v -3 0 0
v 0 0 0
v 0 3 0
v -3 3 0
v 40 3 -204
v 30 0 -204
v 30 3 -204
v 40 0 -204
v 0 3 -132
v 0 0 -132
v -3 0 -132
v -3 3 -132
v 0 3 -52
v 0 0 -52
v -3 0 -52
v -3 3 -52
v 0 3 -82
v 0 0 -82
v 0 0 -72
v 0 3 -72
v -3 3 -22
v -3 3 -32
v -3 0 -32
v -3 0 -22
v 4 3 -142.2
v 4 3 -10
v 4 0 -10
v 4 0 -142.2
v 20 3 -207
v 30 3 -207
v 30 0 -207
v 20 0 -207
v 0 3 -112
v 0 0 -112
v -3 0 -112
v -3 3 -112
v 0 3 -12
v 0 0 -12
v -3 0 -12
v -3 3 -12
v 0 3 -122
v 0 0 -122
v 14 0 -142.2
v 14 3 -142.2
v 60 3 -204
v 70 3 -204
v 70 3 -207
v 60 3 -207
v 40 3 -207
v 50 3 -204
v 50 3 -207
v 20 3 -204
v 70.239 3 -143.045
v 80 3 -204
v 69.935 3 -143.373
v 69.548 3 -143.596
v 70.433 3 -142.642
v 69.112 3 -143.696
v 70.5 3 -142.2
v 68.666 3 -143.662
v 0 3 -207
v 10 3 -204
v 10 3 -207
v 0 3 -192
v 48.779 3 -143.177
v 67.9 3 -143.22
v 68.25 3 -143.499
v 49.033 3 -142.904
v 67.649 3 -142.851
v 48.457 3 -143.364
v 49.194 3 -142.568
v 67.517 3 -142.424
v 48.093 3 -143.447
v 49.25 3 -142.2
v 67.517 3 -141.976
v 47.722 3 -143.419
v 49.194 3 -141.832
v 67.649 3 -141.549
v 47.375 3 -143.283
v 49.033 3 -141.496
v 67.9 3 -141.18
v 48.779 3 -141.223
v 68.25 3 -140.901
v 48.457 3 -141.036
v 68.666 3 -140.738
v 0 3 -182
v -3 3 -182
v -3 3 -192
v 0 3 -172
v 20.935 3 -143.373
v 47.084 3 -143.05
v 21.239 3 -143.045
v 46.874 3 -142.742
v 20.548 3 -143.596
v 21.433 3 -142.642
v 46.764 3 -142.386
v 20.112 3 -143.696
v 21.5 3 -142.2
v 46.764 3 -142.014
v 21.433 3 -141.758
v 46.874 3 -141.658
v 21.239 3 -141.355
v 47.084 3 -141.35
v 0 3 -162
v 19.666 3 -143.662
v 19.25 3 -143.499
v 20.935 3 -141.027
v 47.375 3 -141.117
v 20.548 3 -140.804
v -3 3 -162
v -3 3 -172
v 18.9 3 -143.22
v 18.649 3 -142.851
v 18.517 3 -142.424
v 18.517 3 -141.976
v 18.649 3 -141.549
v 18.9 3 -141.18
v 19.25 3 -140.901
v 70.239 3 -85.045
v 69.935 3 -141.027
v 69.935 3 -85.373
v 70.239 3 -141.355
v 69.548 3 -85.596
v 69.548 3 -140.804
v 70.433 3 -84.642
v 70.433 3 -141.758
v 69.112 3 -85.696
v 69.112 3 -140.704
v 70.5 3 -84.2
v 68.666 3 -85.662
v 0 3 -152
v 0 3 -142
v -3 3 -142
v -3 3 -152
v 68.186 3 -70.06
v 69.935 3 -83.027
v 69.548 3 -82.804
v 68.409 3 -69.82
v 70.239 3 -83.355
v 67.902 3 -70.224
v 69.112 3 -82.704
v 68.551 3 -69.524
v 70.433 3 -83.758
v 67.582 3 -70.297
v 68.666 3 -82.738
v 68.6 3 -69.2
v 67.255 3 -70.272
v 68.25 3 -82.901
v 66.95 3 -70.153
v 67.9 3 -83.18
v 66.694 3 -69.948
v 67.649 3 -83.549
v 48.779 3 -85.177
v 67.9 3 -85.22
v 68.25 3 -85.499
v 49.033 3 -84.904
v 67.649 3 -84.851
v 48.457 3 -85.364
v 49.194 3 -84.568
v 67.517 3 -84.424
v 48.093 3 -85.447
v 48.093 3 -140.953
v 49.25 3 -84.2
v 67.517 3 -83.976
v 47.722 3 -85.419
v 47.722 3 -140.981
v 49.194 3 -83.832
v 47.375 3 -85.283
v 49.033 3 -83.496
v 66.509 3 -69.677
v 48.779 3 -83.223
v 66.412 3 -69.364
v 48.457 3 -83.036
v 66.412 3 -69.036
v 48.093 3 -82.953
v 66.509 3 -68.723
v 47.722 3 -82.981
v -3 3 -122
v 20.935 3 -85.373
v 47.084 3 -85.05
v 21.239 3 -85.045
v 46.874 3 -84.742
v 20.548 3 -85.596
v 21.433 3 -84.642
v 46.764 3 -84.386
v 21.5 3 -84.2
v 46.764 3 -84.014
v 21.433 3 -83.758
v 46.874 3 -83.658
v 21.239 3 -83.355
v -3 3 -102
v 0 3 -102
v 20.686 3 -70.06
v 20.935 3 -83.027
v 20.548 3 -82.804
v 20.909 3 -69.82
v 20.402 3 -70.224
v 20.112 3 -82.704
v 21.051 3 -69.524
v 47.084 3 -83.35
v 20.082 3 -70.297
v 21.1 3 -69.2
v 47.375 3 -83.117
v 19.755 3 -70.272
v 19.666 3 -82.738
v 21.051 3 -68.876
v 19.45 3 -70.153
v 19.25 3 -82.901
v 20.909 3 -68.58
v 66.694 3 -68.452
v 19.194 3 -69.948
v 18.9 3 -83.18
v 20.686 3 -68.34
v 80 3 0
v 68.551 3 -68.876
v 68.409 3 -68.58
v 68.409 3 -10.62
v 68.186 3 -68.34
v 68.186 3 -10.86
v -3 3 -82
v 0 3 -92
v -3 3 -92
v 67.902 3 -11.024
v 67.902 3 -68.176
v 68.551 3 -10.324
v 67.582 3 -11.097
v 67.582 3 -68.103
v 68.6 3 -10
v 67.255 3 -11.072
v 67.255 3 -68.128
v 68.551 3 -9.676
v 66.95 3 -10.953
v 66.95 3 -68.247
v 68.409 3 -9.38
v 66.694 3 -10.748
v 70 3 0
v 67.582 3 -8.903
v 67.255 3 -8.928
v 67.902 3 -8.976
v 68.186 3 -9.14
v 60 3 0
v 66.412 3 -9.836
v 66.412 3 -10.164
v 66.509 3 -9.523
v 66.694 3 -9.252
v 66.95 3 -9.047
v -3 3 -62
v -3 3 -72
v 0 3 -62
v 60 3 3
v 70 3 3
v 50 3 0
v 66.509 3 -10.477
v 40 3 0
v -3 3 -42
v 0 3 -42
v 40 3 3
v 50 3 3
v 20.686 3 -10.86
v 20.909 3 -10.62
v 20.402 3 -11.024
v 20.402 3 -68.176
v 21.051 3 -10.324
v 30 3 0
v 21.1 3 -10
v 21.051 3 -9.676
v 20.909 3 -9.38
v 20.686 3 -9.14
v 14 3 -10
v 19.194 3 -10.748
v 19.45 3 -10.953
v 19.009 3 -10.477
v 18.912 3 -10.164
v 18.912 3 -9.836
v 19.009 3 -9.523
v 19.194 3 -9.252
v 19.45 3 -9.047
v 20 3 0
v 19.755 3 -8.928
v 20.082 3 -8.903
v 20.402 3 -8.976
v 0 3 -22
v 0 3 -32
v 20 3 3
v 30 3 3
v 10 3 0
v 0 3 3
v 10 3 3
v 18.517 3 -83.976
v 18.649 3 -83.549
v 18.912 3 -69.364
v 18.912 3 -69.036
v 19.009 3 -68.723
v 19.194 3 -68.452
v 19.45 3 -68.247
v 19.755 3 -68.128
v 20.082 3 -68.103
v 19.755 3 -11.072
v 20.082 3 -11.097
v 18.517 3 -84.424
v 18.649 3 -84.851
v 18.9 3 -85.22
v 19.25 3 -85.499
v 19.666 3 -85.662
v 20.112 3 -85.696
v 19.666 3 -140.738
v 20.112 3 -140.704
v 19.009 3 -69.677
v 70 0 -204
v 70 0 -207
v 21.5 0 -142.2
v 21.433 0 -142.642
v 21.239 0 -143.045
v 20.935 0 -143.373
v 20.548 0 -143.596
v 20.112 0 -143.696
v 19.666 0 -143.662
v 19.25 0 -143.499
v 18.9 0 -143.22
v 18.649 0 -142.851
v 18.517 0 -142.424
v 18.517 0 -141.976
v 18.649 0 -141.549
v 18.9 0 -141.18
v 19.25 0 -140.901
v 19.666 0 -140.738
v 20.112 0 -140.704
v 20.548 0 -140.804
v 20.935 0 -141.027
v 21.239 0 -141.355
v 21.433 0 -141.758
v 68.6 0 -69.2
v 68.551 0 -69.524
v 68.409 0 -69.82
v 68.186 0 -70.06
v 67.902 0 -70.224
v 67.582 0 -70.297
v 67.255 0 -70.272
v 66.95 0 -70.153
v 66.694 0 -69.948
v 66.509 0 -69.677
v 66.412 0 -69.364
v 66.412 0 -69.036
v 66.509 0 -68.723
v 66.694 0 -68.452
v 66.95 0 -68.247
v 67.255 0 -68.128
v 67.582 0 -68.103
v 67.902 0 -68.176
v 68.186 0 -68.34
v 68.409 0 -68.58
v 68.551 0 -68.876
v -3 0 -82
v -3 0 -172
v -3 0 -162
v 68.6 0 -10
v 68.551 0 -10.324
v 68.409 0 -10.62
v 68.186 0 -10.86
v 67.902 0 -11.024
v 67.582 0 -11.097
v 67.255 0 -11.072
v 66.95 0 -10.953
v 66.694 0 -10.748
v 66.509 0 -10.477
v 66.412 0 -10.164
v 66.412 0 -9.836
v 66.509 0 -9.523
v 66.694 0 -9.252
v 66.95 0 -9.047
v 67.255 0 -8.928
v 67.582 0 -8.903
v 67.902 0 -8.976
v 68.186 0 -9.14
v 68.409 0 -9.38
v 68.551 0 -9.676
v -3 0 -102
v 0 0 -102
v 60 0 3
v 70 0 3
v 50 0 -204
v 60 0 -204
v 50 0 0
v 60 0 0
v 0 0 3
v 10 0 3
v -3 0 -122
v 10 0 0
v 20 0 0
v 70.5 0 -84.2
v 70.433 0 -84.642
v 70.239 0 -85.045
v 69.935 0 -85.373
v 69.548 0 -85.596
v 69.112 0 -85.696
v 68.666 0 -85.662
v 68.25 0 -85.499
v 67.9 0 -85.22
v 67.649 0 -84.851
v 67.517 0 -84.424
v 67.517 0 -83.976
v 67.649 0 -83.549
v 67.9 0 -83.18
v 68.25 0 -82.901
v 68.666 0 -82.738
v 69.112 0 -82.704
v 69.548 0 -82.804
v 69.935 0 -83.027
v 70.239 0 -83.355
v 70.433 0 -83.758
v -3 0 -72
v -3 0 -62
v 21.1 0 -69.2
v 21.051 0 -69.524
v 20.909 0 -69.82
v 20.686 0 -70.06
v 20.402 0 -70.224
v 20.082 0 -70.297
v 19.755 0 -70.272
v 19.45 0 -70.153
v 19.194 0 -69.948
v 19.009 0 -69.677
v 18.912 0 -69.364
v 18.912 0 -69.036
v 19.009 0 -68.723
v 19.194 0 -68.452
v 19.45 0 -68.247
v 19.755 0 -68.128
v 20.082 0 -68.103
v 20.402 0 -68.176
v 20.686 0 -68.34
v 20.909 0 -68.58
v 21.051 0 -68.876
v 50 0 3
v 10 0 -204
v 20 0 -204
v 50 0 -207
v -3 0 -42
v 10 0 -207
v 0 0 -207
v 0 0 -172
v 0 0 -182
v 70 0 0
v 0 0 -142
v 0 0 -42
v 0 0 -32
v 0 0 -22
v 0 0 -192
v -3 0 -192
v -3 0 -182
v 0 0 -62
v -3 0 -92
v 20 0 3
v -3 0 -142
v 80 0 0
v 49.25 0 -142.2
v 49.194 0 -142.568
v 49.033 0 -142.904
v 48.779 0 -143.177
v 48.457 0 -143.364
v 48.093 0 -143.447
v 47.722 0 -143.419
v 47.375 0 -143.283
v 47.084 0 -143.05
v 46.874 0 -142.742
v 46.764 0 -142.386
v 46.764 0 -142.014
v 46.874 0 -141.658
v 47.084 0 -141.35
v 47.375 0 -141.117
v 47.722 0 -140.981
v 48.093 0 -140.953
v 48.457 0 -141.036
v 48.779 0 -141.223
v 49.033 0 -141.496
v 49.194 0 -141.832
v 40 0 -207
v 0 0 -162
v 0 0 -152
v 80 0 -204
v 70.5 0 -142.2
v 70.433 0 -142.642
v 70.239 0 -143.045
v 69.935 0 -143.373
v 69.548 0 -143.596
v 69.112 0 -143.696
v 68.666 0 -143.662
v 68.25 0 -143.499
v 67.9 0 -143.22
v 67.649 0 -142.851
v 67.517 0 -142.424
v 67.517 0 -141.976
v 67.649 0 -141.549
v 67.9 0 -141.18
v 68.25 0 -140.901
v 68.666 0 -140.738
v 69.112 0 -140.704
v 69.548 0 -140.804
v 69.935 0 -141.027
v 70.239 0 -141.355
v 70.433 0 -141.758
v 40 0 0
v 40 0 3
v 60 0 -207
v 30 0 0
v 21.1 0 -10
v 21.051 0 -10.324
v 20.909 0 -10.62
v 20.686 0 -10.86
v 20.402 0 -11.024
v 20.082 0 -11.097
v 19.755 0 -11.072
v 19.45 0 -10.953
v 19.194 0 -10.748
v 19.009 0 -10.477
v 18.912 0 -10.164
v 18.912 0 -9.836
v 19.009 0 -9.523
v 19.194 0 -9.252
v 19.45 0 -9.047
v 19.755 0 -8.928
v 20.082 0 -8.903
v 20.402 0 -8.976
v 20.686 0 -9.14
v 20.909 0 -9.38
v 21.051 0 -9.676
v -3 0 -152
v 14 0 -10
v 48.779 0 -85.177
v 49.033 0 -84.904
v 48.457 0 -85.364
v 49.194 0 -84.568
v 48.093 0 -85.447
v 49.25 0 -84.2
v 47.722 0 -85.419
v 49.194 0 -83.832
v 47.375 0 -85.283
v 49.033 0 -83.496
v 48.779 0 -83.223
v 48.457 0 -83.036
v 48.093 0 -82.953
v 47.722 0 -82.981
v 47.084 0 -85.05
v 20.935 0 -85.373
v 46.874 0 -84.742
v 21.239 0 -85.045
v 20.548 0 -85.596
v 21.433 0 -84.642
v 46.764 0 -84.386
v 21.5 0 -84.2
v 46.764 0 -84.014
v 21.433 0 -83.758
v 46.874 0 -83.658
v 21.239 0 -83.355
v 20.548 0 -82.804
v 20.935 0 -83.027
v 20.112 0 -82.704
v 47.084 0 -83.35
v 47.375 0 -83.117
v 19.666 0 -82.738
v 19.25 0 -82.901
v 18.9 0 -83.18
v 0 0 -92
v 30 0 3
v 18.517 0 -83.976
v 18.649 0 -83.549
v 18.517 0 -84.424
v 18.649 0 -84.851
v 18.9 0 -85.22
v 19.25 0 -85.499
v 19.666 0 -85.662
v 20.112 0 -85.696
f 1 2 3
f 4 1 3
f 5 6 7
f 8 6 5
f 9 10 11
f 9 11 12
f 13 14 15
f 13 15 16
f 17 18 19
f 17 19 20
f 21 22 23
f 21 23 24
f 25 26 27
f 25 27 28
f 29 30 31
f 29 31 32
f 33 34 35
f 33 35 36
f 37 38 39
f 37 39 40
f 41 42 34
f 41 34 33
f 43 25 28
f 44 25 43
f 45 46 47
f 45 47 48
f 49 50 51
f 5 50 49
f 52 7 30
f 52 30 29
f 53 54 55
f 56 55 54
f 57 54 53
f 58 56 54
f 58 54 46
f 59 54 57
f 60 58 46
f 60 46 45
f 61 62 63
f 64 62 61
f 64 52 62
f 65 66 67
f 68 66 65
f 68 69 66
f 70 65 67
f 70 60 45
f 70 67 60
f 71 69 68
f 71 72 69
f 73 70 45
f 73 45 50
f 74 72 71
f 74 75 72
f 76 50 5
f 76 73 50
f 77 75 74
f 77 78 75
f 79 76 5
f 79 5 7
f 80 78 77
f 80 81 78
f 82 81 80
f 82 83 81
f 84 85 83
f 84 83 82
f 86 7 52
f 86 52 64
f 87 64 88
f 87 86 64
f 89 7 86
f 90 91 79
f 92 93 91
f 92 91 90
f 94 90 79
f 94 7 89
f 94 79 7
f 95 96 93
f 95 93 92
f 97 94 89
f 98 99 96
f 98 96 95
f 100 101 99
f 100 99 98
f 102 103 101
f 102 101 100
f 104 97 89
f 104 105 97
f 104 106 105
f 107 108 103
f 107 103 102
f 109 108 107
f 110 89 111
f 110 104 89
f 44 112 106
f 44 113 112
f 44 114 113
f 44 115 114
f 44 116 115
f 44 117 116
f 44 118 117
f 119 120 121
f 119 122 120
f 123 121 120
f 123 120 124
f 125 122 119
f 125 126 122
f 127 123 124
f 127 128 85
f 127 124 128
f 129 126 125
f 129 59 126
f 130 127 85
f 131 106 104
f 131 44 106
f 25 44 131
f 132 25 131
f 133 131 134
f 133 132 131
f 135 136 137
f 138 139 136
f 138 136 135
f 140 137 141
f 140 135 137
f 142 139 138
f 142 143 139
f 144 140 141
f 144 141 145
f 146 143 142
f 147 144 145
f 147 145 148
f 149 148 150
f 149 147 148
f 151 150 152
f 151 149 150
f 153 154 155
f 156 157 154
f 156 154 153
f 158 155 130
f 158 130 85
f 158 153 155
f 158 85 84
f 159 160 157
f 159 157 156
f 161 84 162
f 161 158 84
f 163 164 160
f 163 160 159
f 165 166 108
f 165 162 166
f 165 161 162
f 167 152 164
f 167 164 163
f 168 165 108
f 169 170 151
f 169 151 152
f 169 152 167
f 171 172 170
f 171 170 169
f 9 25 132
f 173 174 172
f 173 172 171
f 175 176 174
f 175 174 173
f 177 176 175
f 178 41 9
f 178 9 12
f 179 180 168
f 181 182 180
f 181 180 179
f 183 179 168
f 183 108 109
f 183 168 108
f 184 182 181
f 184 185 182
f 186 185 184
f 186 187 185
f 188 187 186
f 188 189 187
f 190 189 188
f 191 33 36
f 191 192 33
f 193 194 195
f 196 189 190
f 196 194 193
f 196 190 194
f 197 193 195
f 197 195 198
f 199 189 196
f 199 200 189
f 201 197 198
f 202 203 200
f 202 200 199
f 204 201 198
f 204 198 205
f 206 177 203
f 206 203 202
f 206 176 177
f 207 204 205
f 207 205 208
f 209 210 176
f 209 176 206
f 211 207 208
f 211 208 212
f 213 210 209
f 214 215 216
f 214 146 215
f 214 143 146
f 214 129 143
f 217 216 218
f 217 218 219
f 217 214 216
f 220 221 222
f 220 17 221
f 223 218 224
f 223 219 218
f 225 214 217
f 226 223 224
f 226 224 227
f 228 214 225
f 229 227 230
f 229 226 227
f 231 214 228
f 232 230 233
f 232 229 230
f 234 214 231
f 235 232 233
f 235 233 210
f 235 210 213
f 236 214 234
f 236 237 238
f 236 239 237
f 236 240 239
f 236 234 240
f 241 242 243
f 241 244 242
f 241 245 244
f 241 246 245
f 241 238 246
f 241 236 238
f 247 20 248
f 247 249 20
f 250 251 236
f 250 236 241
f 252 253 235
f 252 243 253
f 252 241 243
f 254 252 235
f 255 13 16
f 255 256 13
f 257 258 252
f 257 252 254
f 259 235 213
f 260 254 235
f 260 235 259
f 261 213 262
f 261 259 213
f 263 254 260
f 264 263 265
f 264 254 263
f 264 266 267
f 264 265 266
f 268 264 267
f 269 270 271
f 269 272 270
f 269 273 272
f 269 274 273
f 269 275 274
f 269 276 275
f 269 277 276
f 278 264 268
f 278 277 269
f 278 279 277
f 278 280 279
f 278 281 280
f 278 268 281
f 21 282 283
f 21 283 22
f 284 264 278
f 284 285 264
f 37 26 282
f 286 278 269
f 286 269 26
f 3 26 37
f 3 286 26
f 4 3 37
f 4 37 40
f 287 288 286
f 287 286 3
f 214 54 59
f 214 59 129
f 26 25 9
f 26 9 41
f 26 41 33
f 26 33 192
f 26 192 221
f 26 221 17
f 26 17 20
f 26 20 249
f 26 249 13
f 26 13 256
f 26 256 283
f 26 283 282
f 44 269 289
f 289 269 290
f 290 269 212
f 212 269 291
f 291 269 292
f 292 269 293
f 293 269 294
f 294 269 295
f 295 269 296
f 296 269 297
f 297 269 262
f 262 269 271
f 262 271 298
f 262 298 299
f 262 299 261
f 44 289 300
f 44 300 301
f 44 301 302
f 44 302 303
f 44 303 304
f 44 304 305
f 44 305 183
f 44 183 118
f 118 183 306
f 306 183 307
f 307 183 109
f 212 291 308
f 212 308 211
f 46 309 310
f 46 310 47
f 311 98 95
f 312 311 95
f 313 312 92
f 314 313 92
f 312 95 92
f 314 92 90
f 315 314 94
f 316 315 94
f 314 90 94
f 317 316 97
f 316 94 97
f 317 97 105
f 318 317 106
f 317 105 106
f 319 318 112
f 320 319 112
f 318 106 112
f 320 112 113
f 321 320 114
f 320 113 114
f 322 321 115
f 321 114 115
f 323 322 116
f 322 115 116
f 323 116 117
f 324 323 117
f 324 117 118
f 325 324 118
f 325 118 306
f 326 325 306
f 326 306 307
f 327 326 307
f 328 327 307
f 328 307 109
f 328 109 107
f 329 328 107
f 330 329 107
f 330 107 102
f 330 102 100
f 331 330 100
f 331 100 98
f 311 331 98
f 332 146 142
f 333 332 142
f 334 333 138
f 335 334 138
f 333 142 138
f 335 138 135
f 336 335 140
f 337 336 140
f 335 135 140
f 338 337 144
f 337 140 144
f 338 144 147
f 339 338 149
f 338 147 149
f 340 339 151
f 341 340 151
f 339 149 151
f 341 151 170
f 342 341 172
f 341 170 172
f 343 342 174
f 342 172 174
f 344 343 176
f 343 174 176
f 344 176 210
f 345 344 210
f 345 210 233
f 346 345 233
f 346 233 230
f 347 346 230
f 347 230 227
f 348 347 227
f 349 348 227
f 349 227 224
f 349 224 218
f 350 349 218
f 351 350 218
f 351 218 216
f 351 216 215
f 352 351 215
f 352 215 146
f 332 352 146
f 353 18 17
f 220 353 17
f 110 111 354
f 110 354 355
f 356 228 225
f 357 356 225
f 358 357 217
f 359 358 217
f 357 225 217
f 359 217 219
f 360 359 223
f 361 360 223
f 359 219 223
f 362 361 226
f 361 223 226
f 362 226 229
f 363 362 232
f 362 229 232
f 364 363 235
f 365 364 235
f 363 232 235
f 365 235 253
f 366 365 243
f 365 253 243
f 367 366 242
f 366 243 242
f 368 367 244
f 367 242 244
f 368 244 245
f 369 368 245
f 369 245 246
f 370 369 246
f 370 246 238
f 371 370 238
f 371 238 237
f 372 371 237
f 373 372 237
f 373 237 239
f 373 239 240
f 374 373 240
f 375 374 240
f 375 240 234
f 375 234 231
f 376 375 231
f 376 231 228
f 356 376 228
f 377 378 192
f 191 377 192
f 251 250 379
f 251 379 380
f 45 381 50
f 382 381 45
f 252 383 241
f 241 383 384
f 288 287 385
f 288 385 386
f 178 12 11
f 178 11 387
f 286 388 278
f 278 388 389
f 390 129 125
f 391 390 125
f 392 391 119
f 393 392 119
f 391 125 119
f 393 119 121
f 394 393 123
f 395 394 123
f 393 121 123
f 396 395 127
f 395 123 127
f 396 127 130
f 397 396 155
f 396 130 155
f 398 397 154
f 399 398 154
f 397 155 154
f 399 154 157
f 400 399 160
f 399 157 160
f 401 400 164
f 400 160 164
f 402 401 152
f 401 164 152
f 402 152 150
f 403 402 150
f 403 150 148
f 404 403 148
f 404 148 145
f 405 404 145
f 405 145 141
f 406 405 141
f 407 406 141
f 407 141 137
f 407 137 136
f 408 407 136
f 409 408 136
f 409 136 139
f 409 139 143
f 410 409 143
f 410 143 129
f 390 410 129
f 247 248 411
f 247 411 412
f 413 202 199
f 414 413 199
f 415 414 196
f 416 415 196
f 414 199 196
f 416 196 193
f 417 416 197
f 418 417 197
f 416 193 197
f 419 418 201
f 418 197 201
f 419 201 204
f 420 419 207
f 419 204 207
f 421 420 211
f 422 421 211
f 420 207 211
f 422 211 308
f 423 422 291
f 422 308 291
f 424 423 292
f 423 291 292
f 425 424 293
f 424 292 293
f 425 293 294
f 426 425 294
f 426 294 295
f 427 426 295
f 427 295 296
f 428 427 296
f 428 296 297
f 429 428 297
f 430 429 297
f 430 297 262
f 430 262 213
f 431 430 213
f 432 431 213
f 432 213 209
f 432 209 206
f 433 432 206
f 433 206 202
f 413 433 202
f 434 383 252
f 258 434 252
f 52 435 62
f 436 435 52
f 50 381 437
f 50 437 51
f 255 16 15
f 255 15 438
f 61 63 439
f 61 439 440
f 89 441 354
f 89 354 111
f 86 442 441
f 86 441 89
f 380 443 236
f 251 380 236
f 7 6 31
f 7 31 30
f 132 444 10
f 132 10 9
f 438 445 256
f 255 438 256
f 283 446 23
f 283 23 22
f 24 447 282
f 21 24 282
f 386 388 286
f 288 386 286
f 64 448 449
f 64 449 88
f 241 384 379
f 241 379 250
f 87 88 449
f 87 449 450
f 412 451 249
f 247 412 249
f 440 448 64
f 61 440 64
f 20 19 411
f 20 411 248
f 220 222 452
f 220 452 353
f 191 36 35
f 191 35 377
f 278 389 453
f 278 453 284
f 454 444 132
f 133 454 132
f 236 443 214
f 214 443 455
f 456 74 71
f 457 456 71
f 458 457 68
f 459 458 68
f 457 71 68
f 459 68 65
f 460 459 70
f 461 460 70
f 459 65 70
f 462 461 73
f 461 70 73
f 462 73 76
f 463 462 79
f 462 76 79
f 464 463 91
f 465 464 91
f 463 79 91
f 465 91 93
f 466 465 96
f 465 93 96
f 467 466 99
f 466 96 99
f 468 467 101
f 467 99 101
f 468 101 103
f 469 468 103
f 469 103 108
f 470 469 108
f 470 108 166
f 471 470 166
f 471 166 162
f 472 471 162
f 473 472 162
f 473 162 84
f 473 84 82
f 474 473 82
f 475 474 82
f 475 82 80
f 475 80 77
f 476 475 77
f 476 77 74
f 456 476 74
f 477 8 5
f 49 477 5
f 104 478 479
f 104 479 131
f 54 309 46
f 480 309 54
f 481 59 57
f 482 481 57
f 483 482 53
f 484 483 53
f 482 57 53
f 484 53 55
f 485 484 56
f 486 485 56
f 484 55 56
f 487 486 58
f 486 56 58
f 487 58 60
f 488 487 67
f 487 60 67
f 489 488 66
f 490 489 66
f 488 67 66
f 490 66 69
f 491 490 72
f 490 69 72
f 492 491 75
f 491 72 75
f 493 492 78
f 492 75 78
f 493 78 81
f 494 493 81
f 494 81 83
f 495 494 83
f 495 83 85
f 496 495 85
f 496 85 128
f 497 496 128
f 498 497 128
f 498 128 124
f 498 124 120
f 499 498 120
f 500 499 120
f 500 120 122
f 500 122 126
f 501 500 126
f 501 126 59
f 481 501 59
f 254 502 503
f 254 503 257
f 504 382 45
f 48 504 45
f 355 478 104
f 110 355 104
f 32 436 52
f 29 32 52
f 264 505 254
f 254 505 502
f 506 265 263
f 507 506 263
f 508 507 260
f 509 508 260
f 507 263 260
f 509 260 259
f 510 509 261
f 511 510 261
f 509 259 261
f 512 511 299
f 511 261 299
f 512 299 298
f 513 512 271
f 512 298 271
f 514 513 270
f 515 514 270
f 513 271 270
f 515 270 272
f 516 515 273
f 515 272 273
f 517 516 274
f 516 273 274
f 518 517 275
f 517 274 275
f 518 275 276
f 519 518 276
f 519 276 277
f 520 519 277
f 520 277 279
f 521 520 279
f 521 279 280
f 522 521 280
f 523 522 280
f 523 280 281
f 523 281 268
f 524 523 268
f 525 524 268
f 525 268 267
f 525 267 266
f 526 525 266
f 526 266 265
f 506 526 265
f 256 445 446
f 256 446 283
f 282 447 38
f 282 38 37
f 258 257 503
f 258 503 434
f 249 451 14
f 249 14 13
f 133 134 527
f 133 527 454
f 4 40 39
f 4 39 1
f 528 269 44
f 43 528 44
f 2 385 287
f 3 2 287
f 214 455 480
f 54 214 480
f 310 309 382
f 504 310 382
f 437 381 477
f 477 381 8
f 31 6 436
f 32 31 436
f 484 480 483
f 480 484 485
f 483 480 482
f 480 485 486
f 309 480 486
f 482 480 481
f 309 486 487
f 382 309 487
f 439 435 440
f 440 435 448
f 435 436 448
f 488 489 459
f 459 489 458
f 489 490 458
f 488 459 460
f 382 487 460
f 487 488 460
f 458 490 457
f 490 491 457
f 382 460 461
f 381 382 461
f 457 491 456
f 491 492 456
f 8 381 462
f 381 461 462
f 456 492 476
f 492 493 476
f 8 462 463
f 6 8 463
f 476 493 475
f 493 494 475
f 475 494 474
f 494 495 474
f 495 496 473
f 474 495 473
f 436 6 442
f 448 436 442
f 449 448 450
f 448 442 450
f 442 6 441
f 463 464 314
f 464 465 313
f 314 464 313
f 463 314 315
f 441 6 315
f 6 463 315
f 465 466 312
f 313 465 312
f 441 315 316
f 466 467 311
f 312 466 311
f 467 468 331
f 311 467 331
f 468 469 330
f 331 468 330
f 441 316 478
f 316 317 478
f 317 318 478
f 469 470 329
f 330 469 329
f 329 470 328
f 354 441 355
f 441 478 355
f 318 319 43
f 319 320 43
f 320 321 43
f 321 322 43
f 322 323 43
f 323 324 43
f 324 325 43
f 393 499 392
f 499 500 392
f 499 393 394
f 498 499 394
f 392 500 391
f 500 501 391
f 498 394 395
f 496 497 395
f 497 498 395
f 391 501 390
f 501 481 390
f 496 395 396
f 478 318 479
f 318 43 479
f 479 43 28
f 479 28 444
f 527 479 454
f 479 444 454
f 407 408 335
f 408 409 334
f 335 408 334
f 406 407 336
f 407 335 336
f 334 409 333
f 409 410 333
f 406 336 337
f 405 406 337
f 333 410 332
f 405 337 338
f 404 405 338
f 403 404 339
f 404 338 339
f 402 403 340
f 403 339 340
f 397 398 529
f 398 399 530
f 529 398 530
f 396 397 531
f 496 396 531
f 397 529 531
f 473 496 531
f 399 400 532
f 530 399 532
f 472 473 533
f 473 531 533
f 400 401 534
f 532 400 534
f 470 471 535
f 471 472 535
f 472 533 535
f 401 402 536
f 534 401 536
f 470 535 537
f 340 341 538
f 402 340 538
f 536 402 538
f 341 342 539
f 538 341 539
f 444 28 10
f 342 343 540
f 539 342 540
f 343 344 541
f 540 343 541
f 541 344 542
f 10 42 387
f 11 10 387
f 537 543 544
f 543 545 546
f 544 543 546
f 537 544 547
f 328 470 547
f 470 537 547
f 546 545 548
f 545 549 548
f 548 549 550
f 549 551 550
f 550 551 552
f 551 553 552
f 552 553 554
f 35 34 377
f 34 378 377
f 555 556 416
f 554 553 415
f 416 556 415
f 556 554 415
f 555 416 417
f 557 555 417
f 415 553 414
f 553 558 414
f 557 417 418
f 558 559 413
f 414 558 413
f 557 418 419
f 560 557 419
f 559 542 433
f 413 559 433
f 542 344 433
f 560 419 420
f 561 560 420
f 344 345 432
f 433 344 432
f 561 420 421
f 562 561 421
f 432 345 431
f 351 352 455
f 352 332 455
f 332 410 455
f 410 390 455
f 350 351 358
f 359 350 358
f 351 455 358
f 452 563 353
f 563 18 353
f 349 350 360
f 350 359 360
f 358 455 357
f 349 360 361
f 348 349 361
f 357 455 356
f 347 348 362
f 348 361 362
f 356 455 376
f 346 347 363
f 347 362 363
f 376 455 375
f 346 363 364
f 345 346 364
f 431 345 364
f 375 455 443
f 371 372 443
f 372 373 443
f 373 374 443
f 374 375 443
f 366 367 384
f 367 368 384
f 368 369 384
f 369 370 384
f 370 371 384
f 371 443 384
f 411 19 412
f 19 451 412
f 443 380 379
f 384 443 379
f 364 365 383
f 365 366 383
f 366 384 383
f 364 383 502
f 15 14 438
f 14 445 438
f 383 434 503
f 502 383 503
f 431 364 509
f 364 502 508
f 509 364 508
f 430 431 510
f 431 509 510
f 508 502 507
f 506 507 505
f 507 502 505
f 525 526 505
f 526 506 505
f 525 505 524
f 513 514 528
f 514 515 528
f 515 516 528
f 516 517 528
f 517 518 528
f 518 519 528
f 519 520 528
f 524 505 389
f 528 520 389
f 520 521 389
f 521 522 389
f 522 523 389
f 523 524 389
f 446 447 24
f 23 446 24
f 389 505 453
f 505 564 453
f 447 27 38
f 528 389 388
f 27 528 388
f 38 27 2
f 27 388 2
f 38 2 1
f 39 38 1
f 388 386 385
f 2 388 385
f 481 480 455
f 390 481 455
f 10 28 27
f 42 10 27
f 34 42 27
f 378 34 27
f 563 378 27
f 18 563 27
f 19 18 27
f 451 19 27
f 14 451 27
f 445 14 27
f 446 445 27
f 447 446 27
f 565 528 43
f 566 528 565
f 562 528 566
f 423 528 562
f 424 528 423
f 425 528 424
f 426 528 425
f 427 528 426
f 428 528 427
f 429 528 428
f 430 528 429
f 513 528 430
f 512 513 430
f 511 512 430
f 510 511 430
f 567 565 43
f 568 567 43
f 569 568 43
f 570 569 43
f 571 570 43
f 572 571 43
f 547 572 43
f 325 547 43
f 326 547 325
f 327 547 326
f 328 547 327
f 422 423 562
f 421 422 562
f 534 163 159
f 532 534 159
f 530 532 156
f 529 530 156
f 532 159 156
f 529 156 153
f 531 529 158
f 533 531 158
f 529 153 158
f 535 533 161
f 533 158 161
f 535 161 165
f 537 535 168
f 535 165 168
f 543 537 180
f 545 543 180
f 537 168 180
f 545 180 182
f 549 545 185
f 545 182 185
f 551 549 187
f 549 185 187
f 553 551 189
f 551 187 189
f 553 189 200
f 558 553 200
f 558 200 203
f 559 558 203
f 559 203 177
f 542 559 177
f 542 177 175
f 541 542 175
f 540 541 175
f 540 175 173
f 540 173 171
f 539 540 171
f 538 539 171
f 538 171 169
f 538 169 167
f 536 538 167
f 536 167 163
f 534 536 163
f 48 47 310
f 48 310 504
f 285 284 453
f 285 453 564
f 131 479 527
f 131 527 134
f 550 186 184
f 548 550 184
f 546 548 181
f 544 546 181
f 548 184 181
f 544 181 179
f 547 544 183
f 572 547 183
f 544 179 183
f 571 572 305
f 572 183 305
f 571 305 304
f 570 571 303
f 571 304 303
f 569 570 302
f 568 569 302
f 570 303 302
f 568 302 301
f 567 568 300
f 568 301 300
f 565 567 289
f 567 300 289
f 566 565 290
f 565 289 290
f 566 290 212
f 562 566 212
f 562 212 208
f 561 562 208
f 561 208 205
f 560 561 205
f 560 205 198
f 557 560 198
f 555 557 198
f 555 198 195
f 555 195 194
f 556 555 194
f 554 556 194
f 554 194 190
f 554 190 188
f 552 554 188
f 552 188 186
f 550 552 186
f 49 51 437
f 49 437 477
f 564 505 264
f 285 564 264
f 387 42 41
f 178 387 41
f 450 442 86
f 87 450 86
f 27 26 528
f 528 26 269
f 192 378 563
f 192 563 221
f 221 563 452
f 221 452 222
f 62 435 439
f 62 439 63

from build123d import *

# Parameters (mm, degrees)
SKETCH1_W           = 80
SKETCH1_H           = 204
BOSS_EXTRUDE1_DEPTH = 3
SKETCH2_W           = 10
SKETCH2_H           = 3
BOSS_EXTRUDE2_DEPTH = 3
LPATTERN1_COUNT     = 4
LPATTERN1_PITCH     = 20
SKETCH3_W           = 10
SKETCH3_H           = 3
BOSS_EXTRUDE3_DEPTH = 3
LPATTERN2_COUNT     = 4
LPATTERN2_PITCH     = 20
SKETCH4_R           = 1.1
SKETCH4_R_2         = 1.5
SKETCH4_R_3         = 1.25
SKETCH4_W           = 10
SKETCH4_H           = 132.2
CUT_EXTRUDE1_DEPTH  = 4
SKETCH5_W           = 12
SKETCH5_H           = 3
SKETCH5_W_2         = 10
BOSS_EXTRUDE4_DEPTH = 3


with BuildPart() as part:
    # Sketch1 → Boss-Extrude1 (new body)
    with BuildSketch(Plane(origin=(0, 0, 0), x_dir=(1, 0, 0), z_dir=(0, 1, 0))):
        with Locations((40, 102)):
            Rectangle(SKETCH1_W, SKETCH1_H)
    extrude(amount=BOSS_EXTRUDE1_DEPTH)

    # Sketch2 → Boss-Extrude2 (add)
    with BuildSketch(Plane.XY):
        with Locations((5, 1.5)):
            Rectangle(SKETCH2_W, SKETCH2_H)
    boss_extrude2 = extrude(amount=BOSS_EXTRUDE2_DEPTH)

    # LPattern1: Boss-Extrude2 ×4
    with Locations(*[(i * LPATTERN1_PITCH, 0, 0) for i in range(1, LPATTERN1_COUNT)]):
        add(boss_extrude2)

    # Sketch3 → Boss-Extrude3 (add)
    with BuildSketch(Plane(origin=(0, 0, -204), x_dir=(-1, 0, 0), z_dir=(0, 0, -1))):
        with Locations((-5, 1.5)):
            Rectangle(SKETCH3_W, SKETCH3_H)
    boss_extrude3 = extrude(amount=BOSS_EXTRUDE3_DEPTH)

    # LPattern2: Boss-Extrude3 ×4
    with Locations(*[(i * LPATTERN2_PITCH, 0, 0) for i in range(1, LPATTERN2_COUNT)]):
        add(boss_extrude3)

    # Sketch4 → Cut-Extrude1 (cut, through all)
    with BuildSketch(Plane(origin=(0, 3, 0), x_dir=(1, 0, 0), z_dir=(0, 1, 0))):
        with Locations((20, 10)):
            Circle(SKETCH4_R)
        with Locations((67.5, 10)):
            Circle(SKETCH4_R)
        with Locations((20, 69.2)):
            Circle(SKETCH4_R)
        with Locations((67.5, 69.2)):
            Circle(SKETCH4_R)
        with Locations((20, 84.2)):
            Circle(SKETCH4_R_2)
        with Locations((69, 84.2)):
            Circle(SKETCH4_R_2)
        with Locations((69, 142.2)):
            Circle(SKETCH4_R_2)
        with Locations((20, 142.2)):
            Circle(SKETCH4_R_2)
        with Locations((48, 84.2)):
            Circle(SKETCH4_R_3)
        with Locations((48, 142.2)):
            Circle(SKETCH4_R_3)
        with Locations((9, 76.1)):
            Rectangle(SKETCH4_W, SKETCH4_H)
    extrude(amount=-CUT_EXTRUDE1_DEPTH, mode=Mode.SUBTRACT)

    # Sketch5 → Boss-Extrude4 (add)
    with BuildSketch(Plane.ZY):
        with Locations((-6, 1.5)):
            Rectangle(SKETCH5_W, SKETCH5_H)
        with Locations((-27, 1.5)):
            Rectangle(SKETCH5_W_2, SKETCH5_H)
        with Locations((-47, 1.5)):
            Rectangle(SKETCH5_W_2, SKETCH5_H)
        with Locations((-67, 1.5)):
            Rectangle(SKETCH5_W_2, SKETCH5_H)
        with Locations((-87, 1.5)):
            Rectangle(SKETCH5_W_2, SKETCH5_H)
        with Locations((-107, 1.5)):
            Rectangle(SKETCH5_W_2, SKETCH5_H)
        with Locations((-127, 1.5)):
            Rectangle(SKETCH5_W_2, SKETCH5_H)
        with Locations((-147, 1.5)):
            Rectangle(SKETCH5_W_2, SKETCH5_H)
        with Locations((-167, 1.5)):
            Rectangle(SKETCH5_W_2, SKETCH5_H)
        with Locations((-187, 1.5)):
            Rectangle(SKETCH5_W_2, SKETCH5_H)
    extrude(amount=BOSS_EXTRUDE4_DEPTH)


solid = part.part
